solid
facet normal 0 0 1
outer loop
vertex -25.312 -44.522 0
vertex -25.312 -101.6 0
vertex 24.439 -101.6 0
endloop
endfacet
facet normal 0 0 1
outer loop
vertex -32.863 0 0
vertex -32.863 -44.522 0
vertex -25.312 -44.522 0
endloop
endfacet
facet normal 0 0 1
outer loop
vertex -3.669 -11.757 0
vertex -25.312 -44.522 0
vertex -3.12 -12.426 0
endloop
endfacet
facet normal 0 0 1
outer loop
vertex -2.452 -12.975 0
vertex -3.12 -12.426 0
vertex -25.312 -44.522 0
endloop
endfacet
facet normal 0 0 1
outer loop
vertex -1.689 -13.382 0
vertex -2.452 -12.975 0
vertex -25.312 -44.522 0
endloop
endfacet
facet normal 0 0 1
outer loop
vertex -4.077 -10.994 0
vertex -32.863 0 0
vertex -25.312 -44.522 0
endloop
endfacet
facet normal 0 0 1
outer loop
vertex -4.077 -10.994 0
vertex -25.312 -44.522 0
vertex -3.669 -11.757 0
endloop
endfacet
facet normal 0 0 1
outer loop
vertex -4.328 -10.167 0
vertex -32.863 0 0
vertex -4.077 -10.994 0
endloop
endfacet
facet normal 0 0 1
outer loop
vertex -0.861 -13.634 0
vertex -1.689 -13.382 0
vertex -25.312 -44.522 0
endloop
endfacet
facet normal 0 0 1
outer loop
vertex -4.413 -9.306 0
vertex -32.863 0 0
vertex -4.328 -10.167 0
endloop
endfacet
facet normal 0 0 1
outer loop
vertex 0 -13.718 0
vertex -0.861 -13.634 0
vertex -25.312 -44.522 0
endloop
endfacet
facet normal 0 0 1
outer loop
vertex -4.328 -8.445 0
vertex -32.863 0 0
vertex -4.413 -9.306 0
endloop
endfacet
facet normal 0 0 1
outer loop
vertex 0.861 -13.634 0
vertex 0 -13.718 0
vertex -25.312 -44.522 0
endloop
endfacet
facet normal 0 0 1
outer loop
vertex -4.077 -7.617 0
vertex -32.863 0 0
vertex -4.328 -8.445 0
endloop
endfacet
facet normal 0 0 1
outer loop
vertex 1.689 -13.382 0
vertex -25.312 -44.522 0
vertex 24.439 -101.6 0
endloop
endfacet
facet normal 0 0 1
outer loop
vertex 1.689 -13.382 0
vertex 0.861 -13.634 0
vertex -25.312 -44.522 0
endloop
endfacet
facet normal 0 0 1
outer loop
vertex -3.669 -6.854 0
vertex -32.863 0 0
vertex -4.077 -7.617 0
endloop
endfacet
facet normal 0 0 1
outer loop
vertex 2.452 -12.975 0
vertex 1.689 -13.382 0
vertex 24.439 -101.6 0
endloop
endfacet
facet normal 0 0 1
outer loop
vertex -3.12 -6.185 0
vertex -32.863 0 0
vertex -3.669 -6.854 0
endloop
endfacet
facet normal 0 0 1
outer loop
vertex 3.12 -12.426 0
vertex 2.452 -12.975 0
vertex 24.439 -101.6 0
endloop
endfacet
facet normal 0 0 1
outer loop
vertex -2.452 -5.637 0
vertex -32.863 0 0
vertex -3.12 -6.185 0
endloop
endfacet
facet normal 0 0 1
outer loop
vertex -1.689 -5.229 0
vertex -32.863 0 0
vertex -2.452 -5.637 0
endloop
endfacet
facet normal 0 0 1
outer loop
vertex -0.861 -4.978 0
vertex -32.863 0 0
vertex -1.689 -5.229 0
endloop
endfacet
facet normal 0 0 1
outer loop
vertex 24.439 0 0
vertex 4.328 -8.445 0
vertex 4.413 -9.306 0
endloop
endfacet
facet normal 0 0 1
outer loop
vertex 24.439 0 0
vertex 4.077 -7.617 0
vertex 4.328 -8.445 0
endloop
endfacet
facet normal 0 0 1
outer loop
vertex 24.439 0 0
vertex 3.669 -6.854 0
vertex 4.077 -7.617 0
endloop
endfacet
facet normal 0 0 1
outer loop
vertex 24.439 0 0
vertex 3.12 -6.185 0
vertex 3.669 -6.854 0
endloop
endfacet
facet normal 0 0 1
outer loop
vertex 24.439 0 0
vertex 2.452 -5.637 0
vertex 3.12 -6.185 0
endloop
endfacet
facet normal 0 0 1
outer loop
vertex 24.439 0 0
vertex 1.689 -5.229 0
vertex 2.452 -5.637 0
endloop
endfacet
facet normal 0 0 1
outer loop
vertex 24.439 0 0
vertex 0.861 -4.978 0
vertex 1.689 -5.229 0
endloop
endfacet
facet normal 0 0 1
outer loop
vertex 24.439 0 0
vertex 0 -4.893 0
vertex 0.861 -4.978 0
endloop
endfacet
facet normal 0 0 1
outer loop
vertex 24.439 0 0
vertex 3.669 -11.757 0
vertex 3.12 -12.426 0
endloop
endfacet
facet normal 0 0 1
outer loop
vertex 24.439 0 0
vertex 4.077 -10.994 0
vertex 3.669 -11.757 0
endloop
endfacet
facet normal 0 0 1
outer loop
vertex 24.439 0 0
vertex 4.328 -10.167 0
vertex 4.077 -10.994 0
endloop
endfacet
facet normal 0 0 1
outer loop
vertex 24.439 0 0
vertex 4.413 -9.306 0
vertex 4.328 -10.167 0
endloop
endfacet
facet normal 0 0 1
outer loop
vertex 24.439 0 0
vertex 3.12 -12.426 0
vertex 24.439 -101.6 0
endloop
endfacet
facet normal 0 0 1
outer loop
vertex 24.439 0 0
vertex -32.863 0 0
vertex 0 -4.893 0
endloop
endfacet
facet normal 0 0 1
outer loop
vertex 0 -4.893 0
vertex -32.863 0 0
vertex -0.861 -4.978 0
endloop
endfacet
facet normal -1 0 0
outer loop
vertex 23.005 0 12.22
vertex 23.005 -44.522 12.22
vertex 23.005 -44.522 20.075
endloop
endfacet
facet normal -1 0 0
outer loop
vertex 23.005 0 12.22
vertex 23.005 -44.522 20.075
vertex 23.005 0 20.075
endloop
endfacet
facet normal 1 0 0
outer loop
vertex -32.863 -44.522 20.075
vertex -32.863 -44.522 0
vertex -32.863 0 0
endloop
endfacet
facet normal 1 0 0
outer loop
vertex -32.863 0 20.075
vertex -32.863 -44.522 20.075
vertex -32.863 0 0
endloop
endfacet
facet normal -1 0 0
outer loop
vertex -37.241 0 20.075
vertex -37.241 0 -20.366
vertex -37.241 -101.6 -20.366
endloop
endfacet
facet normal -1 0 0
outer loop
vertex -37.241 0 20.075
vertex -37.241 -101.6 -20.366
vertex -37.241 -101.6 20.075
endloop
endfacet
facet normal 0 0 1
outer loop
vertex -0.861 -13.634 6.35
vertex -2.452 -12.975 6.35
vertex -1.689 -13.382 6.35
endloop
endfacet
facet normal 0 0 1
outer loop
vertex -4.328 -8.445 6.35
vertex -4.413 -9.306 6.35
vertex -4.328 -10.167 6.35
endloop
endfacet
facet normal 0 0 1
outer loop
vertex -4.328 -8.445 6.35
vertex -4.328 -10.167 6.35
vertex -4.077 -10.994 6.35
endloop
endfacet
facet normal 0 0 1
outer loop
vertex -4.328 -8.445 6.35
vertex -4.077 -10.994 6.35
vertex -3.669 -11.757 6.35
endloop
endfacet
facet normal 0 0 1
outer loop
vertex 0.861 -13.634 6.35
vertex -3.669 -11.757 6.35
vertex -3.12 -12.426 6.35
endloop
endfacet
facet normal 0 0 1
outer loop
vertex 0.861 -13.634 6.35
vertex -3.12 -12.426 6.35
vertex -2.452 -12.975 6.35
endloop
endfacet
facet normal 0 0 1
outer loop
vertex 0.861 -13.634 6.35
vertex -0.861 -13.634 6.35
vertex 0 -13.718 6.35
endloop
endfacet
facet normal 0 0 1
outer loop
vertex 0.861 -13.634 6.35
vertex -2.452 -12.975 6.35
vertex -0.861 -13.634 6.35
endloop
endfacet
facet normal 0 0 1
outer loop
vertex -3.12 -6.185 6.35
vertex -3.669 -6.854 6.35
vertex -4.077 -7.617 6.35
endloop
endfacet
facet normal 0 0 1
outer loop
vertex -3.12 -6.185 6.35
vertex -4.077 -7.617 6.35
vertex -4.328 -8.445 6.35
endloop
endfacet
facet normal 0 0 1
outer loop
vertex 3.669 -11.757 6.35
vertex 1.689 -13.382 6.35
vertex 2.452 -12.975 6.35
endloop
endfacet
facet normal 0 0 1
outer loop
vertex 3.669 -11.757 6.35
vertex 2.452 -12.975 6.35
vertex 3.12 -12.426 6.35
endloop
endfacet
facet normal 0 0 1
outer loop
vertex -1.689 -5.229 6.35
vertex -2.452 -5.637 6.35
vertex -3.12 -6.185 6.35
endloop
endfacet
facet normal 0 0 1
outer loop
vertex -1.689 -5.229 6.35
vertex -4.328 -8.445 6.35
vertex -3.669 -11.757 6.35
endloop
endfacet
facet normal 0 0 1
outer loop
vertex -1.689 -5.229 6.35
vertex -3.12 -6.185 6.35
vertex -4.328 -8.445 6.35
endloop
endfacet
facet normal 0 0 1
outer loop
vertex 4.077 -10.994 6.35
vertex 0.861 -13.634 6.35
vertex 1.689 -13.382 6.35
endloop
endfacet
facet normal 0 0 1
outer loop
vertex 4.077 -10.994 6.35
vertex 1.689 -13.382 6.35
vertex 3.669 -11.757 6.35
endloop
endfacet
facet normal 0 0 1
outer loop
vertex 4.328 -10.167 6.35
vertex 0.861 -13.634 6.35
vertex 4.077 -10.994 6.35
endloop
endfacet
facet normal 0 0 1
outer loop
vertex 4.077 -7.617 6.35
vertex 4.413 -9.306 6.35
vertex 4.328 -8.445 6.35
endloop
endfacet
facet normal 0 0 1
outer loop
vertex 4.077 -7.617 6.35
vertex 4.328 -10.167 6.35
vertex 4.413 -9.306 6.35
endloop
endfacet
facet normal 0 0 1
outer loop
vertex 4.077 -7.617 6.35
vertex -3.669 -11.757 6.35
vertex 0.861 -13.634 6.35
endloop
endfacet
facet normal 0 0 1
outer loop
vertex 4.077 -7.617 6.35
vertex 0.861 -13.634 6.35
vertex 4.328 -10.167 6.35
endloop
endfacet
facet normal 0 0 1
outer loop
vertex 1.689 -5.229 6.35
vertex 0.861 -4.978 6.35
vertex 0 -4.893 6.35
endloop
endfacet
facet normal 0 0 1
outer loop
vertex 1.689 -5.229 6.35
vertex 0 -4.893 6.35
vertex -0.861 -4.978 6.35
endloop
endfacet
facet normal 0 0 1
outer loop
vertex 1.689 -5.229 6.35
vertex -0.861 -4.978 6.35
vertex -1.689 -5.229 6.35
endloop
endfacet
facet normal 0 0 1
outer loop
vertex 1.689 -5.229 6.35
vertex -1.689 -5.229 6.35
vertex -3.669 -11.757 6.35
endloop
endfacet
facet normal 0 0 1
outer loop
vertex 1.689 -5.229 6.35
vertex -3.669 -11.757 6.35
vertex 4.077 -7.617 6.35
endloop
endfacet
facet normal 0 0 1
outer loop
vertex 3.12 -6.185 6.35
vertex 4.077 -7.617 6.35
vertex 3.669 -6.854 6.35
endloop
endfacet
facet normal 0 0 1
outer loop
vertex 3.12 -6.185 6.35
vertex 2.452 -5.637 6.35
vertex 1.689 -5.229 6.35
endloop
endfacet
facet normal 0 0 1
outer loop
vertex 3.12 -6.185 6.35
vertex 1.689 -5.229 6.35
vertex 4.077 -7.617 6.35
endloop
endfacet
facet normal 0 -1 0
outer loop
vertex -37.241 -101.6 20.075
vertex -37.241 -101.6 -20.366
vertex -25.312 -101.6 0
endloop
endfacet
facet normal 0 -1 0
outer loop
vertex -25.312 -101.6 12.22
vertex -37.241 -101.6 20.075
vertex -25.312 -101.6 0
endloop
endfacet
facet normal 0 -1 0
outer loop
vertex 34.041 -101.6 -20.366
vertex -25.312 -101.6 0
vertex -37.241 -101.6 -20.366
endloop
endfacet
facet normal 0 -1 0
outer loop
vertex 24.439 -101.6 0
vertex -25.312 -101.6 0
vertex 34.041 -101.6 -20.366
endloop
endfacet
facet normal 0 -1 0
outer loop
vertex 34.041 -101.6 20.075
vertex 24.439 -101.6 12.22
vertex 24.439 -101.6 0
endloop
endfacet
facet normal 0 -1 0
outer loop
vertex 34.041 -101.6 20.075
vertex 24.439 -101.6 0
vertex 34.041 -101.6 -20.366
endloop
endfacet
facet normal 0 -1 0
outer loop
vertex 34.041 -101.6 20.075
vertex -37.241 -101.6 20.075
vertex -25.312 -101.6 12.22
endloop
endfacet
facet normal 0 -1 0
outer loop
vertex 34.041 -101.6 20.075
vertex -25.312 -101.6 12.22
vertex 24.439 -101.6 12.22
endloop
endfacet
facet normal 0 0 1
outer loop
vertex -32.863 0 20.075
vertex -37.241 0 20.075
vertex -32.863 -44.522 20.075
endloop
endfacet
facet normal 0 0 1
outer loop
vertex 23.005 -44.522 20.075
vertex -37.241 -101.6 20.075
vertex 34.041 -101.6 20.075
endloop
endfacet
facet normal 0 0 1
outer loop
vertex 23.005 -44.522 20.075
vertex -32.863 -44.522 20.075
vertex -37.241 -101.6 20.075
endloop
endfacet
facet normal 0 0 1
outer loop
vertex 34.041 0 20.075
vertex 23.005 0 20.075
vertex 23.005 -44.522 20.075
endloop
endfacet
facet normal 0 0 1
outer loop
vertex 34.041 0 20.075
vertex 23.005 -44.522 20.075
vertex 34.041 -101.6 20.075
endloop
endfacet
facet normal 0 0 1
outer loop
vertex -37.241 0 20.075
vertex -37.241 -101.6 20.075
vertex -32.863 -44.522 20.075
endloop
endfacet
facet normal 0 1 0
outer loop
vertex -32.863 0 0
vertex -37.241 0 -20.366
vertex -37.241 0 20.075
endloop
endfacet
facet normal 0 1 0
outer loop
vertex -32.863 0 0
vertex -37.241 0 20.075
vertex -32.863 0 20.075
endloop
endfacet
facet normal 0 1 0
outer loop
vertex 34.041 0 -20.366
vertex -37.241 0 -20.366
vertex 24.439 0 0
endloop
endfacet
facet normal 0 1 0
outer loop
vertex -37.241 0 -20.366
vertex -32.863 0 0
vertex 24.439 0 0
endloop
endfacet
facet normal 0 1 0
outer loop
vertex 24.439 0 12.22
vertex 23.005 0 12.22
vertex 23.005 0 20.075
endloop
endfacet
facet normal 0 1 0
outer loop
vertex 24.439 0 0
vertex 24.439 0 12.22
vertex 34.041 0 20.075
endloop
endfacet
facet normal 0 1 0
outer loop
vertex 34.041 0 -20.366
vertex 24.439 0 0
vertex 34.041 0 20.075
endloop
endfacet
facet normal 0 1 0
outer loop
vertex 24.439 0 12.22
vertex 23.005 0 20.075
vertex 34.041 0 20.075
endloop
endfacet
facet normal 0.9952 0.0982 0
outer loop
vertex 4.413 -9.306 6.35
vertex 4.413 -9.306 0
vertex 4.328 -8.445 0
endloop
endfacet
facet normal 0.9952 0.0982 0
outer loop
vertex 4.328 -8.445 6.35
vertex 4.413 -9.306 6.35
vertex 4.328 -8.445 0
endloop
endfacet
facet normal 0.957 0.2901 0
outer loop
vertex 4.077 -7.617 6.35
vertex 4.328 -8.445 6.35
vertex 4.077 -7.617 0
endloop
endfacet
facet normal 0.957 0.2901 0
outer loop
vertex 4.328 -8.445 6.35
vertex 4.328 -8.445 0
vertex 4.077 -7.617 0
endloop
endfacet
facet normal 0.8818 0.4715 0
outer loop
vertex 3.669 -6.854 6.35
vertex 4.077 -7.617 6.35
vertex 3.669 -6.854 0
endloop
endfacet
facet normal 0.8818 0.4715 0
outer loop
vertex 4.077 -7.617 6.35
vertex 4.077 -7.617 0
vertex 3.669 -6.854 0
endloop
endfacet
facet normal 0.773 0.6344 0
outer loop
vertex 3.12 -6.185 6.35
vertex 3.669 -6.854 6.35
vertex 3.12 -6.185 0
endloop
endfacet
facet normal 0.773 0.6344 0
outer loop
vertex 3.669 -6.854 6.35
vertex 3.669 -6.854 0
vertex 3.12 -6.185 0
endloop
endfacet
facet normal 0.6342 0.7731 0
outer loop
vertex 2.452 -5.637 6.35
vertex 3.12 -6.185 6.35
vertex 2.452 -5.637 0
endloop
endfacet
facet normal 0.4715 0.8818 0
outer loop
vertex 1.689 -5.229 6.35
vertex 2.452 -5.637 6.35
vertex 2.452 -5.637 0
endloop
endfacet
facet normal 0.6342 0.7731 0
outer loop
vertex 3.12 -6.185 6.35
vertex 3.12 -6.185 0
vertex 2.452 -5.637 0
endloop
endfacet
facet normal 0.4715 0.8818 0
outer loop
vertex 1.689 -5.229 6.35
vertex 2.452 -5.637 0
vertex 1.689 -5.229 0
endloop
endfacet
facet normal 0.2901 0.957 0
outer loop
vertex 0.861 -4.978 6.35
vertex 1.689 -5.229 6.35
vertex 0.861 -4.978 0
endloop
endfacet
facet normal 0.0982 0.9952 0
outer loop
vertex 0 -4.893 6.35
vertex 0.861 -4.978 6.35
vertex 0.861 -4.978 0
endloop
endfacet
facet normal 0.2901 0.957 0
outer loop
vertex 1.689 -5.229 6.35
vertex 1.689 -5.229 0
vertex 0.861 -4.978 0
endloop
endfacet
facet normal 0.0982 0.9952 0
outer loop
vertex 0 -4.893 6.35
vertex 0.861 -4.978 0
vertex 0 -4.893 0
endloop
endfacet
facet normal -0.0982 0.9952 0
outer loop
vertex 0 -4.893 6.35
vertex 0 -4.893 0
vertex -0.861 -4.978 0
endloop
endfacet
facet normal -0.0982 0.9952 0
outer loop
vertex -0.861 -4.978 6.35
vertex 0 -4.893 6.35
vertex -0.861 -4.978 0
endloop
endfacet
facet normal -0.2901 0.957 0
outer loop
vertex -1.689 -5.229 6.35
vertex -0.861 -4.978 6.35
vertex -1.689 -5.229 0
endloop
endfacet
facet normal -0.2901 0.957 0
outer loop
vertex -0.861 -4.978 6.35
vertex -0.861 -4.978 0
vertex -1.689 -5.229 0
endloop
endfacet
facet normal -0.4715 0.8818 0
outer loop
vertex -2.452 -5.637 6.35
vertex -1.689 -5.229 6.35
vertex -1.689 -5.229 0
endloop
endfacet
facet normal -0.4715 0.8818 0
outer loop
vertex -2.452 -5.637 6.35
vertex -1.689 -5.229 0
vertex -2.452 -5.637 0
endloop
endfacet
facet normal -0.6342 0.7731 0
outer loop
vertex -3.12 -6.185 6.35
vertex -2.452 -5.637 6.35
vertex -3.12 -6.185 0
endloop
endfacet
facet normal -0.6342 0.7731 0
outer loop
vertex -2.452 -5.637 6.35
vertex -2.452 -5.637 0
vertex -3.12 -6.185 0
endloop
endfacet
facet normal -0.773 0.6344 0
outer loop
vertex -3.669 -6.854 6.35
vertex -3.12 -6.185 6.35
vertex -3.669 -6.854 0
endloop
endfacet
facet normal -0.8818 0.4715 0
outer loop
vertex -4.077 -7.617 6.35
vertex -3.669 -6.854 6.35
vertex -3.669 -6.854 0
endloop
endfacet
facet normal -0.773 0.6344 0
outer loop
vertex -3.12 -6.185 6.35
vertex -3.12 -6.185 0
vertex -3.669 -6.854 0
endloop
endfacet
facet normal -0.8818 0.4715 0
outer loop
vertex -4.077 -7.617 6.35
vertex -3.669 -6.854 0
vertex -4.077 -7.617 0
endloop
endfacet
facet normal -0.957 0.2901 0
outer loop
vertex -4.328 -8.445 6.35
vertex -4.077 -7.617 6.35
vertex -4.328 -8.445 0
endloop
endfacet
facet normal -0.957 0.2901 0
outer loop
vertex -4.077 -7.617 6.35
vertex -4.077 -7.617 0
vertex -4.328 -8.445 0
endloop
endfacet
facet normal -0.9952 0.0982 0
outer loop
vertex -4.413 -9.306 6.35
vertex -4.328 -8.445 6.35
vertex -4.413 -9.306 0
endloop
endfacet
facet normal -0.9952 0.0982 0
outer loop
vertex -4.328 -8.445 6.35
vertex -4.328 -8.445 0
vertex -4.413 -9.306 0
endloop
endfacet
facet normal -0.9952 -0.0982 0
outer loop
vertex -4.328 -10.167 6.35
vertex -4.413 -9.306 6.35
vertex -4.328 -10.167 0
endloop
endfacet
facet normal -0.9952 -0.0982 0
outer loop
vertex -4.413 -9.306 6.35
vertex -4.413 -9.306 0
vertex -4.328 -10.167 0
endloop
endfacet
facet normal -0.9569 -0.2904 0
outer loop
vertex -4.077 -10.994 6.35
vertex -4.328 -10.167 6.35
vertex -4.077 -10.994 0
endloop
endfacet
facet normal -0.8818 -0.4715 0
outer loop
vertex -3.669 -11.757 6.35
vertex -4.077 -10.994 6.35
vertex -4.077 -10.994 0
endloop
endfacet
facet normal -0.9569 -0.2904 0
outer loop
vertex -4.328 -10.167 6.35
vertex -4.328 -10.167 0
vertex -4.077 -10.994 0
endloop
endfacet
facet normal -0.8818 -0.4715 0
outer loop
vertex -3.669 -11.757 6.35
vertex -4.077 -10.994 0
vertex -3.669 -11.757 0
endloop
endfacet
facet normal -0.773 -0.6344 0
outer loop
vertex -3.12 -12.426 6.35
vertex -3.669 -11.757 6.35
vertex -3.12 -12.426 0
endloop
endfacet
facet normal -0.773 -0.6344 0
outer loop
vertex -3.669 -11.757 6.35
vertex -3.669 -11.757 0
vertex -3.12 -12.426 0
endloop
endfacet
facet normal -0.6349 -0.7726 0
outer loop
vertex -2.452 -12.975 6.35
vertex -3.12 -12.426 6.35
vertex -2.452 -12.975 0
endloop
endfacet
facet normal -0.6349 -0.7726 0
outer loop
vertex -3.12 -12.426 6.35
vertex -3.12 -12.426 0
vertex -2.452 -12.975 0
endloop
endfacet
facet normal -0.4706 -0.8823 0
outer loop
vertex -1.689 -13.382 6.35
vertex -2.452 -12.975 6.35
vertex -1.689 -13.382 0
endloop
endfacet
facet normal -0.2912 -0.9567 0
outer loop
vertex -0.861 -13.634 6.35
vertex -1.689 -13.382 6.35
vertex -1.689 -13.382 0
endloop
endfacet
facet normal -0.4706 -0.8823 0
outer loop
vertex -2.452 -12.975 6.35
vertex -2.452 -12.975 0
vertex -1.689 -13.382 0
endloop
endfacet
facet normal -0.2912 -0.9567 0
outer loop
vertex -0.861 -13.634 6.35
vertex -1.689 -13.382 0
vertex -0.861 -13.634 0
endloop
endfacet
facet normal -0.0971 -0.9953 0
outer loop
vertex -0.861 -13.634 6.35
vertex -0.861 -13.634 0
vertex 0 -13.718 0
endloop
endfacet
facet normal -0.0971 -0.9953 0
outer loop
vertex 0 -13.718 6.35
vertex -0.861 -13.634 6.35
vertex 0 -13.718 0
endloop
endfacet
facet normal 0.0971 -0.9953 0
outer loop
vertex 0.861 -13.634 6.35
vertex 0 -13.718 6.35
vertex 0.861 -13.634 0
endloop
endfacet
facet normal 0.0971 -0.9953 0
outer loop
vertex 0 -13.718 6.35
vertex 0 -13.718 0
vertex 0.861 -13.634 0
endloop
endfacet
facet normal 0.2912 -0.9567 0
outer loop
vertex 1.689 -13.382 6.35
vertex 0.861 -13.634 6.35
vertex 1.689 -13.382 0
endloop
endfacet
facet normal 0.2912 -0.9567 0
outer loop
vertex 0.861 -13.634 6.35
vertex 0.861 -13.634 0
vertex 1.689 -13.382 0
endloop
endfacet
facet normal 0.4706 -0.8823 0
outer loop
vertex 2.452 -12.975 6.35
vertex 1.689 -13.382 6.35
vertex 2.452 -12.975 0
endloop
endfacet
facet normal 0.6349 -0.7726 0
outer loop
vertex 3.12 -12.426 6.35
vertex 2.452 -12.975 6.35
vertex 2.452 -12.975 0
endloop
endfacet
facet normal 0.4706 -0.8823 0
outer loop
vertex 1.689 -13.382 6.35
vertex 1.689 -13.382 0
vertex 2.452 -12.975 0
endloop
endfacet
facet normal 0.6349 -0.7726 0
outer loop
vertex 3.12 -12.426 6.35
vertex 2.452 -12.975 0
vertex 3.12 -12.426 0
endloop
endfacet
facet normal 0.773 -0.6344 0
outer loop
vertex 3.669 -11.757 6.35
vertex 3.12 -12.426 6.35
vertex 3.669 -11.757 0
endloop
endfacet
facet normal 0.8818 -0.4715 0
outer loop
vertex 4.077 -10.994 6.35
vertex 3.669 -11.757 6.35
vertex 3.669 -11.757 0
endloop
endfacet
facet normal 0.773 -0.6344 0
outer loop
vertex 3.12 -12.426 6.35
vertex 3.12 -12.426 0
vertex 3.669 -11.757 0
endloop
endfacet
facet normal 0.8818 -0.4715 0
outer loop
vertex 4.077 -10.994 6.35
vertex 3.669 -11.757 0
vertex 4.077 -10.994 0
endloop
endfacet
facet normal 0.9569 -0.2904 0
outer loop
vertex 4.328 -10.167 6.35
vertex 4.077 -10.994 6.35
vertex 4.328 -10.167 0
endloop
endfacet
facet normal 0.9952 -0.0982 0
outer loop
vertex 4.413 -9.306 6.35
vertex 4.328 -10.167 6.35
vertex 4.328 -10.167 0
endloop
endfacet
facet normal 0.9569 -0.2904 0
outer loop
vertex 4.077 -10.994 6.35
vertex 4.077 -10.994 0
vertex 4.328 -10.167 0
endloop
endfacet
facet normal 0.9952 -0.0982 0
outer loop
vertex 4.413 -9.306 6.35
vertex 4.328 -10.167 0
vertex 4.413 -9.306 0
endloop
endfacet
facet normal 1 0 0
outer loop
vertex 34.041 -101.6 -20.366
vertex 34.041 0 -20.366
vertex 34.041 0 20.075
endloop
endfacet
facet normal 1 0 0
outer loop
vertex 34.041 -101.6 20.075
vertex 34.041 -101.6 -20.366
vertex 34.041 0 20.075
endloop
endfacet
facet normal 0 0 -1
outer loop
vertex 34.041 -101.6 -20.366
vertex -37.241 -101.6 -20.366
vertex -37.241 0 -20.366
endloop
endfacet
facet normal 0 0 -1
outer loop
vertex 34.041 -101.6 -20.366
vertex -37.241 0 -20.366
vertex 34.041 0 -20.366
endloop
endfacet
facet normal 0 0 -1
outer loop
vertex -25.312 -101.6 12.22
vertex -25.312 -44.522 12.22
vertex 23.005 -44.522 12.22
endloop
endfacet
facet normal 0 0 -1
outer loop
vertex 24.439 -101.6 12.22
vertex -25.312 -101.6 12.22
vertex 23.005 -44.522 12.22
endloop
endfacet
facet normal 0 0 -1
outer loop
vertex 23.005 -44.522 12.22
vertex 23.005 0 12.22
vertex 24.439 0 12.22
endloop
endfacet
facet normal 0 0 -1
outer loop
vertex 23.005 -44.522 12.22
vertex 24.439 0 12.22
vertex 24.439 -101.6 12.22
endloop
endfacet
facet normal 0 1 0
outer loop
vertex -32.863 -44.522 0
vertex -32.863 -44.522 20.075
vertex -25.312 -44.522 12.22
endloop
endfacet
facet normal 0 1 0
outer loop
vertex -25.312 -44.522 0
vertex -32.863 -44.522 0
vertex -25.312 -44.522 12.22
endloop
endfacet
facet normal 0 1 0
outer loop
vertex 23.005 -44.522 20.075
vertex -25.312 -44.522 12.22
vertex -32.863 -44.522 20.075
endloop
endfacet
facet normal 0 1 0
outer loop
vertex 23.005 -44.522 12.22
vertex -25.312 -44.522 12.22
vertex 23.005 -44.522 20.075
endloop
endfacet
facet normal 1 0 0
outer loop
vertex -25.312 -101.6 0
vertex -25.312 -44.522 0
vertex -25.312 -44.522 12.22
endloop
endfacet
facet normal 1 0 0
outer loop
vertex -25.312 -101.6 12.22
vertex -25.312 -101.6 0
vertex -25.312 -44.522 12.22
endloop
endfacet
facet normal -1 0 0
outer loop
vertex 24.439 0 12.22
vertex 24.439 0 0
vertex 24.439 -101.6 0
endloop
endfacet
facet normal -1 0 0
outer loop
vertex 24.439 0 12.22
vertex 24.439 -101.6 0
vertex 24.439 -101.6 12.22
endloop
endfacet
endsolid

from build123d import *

# Parameters (mm, degrees)
F0_W     = 71.2816417217
F0_H     = 40.4414199293
F2_DEPTH = 101.6
F1_W     = 49.7516710311
F1_H     = 12.2197093442
F3_DEPTH = 101.6
F4_R     = 4.4126696885
F5_DEPTH = 6.35
F6_W     = 55.8680891991
F6_H     = 44.7704729486
F7_DEPTH = 101.6
F8_DEPTH = 6.35


with BuildPart() as f2:
    # F0 (on Front) → F2 (new body)
    with BuildSketch(Plane.XZ):
        with Locations((-1.6001984477, -0.1454725862)):
            Rectangle(F0_W, F0_H)
    extrude(amount=F2_DEPTH)

    # F1 (on Front) → F3 (cut)
    with BuildSketch(Plane.XZ):
        with Locations((-0.4364186898, 6.1098546721)):
            Rectangle(F1_W, F1_H)
    extrude(amount=F3_DEPTH, mode=Mode.SUBTRACT)

    # F4 (on Top) → F5 (join)
    with BuildSketch(Plane.XY):
        with Locations((0, -9.3056354672)):
            Circle(F4_R)
    extrude(amount=F5_DEPTH)

    # F6 (on Top) → F7 (cut)
    with BuildSketch(Plane.XY):
        with Locations((-4.929035902, -22.1368068433)):
            Rectangle(F6_W, F6_H)
    extrude(amount=F7_DEPTH, mode=Mode.SUBTRACT)

    # F4 (on Top) → F8 (join)
    with BuildSketch(Plane.XY):
        with Locations((0, -9.3056354672)):
            Circle(F4_R)
    extrude(amount=F8_DEPTH)


solid = f2.part
